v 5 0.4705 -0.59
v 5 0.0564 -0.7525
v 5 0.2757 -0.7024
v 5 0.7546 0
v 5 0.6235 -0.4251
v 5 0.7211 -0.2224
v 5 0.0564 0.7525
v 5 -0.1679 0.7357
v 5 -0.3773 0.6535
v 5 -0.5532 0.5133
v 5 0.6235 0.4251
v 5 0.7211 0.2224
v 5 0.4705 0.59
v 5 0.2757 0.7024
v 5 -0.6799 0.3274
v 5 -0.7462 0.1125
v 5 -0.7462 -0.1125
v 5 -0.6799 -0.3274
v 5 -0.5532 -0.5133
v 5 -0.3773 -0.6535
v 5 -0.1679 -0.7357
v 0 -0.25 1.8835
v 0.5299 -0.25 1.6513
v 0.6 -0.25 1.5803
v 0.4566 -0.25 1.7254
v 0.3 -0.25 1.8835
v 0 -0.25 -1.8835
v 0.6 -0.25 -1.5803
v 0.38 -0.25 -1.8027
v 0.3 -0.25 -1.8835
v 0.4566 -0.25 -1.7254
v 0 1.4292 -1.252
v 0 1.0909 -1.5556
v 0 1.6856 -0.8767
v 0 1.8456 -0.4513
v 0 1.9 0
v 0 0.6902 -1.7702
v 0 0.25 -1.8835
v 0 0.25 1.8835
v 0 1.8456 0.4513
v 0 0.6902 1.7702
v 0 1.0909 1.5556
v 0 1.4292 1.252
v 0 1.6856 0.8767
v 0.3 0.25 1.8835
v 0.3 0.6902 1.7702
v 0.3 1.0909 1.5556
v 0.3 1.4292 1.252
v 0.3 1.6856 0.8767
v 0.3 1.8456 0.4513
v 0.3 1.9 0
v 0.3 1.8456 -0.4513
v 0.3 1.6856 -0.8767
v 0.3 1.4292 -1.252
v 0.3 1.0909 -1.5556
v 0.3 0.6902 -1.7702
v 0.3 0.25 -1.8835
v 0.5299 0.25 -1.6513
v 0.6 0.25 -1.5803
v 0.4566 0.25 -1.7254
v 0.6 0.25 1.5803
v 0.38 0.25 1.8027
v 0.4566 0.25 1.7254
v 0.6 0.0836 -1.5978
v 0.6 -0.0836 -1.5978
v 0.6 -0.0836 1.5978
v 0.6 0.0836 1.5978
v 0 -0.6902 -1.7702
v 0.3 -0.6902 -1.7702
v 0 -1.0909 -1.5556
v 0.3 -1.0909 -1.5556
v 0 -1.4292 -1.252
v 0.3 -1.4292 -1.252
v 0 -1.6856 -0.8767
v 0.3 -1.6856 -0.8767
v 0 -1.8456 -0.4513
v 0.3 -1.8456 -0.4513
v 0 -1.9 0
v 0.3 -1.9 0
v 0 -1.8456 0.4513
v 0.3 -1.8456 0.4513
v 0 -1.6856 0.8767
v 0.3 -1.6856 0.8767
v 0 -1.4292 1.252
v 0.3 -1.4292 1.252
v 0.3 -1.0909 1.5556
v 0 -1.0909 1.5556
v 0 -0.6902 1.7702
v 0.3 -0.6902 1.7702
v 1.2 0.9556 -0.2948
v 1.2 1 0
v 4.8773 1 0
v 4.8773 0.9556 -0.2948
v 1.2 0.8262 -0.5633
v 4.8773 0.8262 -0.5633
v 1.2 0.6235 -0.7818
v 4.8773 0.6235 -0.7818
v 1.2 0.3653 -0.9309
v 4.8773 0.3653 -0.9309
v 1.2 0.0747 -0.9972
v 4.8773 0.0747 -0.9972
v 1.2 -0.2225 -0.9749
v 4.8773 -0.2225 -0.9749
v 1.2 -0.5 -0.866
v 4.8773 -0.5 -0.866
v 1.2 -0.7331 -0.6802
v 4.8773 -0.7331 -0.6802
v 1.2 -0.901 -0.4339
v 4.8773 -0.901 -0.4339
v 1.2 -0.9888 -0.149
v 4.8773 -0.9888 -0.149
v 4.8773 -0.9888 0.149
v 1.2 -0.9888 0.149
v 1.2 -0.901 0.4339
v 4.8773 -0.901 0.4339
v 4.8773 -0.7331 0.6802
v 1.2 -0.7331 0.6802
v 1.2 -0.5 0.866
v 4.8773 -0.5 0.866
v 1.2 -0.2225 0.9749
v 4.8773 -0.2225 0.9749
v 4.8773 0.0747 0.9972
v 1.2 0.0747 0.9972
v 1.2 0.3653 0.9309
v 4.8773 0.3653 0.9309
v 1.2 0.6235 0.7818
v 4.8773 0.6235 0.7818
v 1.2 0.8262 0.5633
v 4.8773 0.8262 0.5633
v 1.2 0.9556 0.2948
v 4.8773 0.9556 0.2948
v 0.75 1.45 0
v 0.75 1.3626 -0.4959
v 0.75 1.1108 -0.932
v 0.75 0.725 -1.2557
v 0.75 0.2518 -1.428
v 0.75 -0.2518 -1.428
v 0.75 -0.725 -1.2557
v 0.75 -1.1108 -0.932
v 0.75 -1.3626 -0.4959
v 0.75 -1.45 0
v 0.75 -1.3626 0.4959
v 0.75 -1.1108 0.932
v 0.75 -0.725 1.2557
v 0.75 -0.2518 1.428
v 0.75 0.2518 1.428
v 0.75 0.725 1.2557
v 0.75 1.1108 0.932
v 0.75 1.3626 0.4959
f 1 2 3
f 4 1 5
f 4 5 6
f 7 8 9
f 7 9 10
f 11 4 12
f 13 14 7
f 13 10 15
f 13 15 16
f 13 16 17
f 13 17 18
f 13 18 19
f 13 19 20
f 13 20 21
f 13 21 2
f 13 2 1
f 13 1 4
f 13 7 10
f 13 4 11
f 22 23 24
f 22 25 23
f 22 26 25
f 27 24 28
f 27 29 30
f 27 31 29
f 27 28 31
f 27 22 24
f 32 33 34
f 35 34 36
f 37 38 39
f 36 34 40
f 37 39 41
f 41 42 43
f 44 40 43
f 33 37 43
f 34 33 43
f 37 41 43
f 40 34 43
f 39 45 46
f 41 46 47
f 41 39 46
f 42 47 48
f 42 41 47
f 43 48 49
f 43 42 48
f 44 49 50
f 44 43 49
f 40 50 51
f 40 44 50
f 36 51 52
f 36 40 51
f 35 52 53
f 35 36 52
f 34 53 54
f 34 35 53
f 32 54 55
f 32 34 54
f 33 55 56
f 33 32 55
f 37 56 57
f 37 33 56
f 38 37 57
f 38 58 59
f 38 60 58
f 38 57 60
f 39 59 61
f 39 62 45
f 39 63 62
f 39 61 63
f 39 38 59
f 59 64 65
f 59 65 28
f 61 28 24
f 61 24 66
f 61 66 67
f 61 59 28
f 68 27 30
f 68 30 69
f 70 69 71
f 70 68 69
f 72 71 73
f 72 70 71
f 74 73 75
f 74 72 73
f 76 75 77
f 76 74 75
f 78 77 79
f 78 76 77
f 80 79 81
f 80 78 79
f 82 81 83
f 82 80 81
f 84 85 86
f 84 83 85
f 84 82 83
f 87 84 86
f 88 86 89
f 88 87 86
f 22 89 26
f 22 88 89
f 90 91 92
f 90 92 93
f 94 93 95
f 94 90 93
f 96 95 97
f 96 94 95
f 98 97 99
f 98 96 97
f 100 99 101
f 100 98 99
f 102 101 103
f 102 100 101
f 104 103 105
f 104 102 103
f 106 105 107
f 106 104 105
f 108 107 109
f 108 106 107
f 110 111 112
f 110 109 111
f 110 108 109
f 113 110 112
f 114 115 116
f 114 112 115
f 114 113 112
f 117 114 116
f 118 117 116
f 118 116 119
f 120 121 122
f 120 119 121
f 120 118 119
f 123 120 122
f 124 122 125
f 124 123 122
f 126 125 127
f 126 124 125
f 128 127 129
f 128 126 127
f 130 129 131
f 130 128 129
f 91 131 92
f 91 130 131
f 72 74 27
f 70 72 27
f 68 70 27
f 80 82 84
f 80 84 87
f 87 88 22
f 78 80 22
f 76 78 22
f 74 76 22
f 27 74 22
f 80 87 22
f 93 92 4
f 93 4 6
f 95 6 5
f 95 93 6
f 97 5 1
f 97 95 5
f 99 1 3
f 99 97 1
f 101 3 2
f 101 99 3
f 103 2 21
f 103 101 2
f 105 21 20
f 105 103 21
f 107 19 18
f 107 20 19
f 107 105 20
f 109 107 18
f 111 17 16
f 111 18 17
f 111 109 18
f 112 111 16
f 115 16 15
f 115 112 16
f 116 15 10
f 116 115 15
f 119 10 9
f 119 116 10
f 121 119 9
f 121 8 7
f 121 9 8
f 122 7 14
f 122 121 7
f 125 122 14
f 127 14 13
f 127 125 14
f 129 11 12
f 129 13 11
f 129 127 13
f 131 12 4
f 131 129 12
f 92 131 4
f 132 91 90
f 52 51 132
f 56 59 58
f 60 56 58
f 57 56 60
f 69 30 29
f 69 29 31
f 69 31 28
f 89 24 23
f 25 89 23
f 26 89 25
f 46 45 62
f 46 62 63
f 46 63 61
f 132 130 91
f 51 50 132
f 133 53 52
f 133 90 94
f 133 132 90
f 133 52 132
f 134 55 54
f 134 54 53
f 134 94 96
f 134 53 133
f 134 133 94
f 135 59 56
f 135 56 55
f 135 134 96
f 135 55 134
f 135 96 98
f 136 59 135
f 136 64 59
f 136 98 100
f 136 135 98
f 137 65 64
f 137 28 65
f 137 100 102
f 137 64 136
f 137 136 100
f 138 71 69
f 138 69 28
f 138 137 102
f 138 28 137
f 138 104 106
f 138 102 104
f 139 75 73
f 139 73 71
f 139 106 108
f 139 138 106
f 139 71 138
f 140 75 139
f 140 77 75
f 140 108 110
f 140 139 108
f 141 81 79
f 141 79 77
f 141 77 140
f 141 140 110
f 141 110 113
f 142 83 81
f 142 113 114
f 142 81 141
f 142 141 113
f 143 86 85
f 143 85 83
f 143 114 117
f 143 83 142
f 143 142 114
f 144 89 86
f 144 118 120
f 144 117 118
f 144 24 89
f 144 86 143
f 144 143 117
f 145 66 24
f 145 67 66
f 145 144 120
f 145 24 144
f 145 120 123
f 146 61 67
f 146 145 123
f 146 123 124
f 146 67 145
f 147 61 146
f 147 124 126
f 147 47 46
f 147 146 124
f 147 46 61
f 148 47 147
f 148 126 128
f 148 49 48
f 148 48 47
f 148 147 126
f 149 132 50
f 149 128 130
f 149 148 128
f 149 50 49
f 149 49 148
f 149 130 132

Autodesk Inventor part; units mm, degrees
ref_plane "YZ Plane" through (0, 0, 0) normal (1, 0, 0) x (0, 1, 0)
ref_plane "XZ Plane" through (0, 0, 0) normal (0, 1, 0) x (-1, 0, 0)
sketch "Sketch1" plane through (0, 0, 0) normal (0, 0, 1) x (1, 0, 0)
  line L0 (0, 0) -> (5, 0)
  line L1 (5, 0) -> (5, 1)
  line L2 (5, 1) -> (2, 1)
  line L3 (2, 1) -> (1.7546, 1)
  line L4 (1.7546, 1) -> (1.2, 1)
  line L5 (1.2, 1) -> (0.3, 1.9)
  line L6 (0.3, 1.9) -> (0, 1.9)
  line L7 (0, 1.9) -> (0, 0)
  line L8 (2, 1) -> (1.2, 1) construction
  line L9 (-1, 0) -> (6, 0) projected
  line L10 (0, 2.28) -> (0, -0.38) projected
  dimension "d0" = 5
  dimension "d1" = 45
  dimension "d2" = 0.2454
  dimension "d3" = 3
  dimension "d4" = 1.2
  dimension "d5" = 2
  dimension "d6" = 2
  dimension "d7" = 3.8
revolve "Body" add sketch "Sketch1" angle 360 about axis through (0, 0, 0) along (1, 0, 0)
sketch "Sketch2" plane through (0, 0, 0) normal (-1, 0, 0) x (0, 0, 1)
  line L0 (1.9, -0.25) -> (-1.9, -0.25)
  line L1 (-1.9, -0.25) -> (-1.9, 0.25)
  line L2 (-1.9, 0.25) -> (1.9, 0.25)
  line L3 (1.9, 0.25) -> (1.9, -0.25)
  line L4 (0, 0.25) -> (0, -0.25) construction
  line L5 (-1.9, 0) -> (1.9, 0) construction
  line L6 (0, 1.9) -> (0, 0) projected
  dimension "d15" = 0.5
  dimension "d16" = 3.8
extrude "Slot" cut sketch "Sketch2" against normal blind 0.6
thread "Thread" size "M2x0.4" class "6g" standard "ISO Metric profile" length 3
chamfer "Chamfer1" distance 0.2454 distance2 0.1227 1 edges at (5, -1, 0) measured on face at (5, -0.0858, 0.7069)
ref_plane "Work Plane1" through (33.575, 0, 0) normal (0, 0, -1) x (1, 0, 0)
equation "\"d0\" = NLG"
equation "\"d1\" = 0.5 * SEWI"
equation "\"d2\" = GAL"
equation "\"d3\" = GEL"
equation "\"d4\" = KOH"
equation "\"d5\" = BDM"
equation "\"d6\" = GD"
equation "\"d7\" = KOD"
equation "\"d15\" = SBR"
equation "\"d16\" = KOD"
equation "\"d8\" = STI"
equation "\"d10\" = GEL"
equation "\"d12\" = -0.5 * SPD + 0.5 * GD"
equation "\"d13\" = 0.5 * GAL"
equation "\"NLG\" = 5"
equation "\"GAL\" = 0.61345 * PTC"
equation "\"GEL\" = 3"
equation "\"KOH\" = 1.2"
equation "\"KOD\" = 3.8"
equation "\"SEWI\" = 90deg"
equation "\"BDM\" = NND"
equation "\"GD\" = NND"
equation "\"SBR\" = 0.5"
equation "\"STI\" = 0.6"
equation "\"SPD\" = NND - 1.2269 * PTC"
equation "\"GUL\" = 0.61345 * PTC"
equation "\"PTC\" = 0.4"
equation "\"EPV\" = 2.2"
equation "\"THREADDIA\" = 2"
equation "\"TOA\" = 30deg"
equation "\"NND\" = 2"
equation "\"GD1\" = THREADDIA - 1.2269 * PTC"
properties part number "DIN 963 - M2 x 5" material "Steel, Mild"
